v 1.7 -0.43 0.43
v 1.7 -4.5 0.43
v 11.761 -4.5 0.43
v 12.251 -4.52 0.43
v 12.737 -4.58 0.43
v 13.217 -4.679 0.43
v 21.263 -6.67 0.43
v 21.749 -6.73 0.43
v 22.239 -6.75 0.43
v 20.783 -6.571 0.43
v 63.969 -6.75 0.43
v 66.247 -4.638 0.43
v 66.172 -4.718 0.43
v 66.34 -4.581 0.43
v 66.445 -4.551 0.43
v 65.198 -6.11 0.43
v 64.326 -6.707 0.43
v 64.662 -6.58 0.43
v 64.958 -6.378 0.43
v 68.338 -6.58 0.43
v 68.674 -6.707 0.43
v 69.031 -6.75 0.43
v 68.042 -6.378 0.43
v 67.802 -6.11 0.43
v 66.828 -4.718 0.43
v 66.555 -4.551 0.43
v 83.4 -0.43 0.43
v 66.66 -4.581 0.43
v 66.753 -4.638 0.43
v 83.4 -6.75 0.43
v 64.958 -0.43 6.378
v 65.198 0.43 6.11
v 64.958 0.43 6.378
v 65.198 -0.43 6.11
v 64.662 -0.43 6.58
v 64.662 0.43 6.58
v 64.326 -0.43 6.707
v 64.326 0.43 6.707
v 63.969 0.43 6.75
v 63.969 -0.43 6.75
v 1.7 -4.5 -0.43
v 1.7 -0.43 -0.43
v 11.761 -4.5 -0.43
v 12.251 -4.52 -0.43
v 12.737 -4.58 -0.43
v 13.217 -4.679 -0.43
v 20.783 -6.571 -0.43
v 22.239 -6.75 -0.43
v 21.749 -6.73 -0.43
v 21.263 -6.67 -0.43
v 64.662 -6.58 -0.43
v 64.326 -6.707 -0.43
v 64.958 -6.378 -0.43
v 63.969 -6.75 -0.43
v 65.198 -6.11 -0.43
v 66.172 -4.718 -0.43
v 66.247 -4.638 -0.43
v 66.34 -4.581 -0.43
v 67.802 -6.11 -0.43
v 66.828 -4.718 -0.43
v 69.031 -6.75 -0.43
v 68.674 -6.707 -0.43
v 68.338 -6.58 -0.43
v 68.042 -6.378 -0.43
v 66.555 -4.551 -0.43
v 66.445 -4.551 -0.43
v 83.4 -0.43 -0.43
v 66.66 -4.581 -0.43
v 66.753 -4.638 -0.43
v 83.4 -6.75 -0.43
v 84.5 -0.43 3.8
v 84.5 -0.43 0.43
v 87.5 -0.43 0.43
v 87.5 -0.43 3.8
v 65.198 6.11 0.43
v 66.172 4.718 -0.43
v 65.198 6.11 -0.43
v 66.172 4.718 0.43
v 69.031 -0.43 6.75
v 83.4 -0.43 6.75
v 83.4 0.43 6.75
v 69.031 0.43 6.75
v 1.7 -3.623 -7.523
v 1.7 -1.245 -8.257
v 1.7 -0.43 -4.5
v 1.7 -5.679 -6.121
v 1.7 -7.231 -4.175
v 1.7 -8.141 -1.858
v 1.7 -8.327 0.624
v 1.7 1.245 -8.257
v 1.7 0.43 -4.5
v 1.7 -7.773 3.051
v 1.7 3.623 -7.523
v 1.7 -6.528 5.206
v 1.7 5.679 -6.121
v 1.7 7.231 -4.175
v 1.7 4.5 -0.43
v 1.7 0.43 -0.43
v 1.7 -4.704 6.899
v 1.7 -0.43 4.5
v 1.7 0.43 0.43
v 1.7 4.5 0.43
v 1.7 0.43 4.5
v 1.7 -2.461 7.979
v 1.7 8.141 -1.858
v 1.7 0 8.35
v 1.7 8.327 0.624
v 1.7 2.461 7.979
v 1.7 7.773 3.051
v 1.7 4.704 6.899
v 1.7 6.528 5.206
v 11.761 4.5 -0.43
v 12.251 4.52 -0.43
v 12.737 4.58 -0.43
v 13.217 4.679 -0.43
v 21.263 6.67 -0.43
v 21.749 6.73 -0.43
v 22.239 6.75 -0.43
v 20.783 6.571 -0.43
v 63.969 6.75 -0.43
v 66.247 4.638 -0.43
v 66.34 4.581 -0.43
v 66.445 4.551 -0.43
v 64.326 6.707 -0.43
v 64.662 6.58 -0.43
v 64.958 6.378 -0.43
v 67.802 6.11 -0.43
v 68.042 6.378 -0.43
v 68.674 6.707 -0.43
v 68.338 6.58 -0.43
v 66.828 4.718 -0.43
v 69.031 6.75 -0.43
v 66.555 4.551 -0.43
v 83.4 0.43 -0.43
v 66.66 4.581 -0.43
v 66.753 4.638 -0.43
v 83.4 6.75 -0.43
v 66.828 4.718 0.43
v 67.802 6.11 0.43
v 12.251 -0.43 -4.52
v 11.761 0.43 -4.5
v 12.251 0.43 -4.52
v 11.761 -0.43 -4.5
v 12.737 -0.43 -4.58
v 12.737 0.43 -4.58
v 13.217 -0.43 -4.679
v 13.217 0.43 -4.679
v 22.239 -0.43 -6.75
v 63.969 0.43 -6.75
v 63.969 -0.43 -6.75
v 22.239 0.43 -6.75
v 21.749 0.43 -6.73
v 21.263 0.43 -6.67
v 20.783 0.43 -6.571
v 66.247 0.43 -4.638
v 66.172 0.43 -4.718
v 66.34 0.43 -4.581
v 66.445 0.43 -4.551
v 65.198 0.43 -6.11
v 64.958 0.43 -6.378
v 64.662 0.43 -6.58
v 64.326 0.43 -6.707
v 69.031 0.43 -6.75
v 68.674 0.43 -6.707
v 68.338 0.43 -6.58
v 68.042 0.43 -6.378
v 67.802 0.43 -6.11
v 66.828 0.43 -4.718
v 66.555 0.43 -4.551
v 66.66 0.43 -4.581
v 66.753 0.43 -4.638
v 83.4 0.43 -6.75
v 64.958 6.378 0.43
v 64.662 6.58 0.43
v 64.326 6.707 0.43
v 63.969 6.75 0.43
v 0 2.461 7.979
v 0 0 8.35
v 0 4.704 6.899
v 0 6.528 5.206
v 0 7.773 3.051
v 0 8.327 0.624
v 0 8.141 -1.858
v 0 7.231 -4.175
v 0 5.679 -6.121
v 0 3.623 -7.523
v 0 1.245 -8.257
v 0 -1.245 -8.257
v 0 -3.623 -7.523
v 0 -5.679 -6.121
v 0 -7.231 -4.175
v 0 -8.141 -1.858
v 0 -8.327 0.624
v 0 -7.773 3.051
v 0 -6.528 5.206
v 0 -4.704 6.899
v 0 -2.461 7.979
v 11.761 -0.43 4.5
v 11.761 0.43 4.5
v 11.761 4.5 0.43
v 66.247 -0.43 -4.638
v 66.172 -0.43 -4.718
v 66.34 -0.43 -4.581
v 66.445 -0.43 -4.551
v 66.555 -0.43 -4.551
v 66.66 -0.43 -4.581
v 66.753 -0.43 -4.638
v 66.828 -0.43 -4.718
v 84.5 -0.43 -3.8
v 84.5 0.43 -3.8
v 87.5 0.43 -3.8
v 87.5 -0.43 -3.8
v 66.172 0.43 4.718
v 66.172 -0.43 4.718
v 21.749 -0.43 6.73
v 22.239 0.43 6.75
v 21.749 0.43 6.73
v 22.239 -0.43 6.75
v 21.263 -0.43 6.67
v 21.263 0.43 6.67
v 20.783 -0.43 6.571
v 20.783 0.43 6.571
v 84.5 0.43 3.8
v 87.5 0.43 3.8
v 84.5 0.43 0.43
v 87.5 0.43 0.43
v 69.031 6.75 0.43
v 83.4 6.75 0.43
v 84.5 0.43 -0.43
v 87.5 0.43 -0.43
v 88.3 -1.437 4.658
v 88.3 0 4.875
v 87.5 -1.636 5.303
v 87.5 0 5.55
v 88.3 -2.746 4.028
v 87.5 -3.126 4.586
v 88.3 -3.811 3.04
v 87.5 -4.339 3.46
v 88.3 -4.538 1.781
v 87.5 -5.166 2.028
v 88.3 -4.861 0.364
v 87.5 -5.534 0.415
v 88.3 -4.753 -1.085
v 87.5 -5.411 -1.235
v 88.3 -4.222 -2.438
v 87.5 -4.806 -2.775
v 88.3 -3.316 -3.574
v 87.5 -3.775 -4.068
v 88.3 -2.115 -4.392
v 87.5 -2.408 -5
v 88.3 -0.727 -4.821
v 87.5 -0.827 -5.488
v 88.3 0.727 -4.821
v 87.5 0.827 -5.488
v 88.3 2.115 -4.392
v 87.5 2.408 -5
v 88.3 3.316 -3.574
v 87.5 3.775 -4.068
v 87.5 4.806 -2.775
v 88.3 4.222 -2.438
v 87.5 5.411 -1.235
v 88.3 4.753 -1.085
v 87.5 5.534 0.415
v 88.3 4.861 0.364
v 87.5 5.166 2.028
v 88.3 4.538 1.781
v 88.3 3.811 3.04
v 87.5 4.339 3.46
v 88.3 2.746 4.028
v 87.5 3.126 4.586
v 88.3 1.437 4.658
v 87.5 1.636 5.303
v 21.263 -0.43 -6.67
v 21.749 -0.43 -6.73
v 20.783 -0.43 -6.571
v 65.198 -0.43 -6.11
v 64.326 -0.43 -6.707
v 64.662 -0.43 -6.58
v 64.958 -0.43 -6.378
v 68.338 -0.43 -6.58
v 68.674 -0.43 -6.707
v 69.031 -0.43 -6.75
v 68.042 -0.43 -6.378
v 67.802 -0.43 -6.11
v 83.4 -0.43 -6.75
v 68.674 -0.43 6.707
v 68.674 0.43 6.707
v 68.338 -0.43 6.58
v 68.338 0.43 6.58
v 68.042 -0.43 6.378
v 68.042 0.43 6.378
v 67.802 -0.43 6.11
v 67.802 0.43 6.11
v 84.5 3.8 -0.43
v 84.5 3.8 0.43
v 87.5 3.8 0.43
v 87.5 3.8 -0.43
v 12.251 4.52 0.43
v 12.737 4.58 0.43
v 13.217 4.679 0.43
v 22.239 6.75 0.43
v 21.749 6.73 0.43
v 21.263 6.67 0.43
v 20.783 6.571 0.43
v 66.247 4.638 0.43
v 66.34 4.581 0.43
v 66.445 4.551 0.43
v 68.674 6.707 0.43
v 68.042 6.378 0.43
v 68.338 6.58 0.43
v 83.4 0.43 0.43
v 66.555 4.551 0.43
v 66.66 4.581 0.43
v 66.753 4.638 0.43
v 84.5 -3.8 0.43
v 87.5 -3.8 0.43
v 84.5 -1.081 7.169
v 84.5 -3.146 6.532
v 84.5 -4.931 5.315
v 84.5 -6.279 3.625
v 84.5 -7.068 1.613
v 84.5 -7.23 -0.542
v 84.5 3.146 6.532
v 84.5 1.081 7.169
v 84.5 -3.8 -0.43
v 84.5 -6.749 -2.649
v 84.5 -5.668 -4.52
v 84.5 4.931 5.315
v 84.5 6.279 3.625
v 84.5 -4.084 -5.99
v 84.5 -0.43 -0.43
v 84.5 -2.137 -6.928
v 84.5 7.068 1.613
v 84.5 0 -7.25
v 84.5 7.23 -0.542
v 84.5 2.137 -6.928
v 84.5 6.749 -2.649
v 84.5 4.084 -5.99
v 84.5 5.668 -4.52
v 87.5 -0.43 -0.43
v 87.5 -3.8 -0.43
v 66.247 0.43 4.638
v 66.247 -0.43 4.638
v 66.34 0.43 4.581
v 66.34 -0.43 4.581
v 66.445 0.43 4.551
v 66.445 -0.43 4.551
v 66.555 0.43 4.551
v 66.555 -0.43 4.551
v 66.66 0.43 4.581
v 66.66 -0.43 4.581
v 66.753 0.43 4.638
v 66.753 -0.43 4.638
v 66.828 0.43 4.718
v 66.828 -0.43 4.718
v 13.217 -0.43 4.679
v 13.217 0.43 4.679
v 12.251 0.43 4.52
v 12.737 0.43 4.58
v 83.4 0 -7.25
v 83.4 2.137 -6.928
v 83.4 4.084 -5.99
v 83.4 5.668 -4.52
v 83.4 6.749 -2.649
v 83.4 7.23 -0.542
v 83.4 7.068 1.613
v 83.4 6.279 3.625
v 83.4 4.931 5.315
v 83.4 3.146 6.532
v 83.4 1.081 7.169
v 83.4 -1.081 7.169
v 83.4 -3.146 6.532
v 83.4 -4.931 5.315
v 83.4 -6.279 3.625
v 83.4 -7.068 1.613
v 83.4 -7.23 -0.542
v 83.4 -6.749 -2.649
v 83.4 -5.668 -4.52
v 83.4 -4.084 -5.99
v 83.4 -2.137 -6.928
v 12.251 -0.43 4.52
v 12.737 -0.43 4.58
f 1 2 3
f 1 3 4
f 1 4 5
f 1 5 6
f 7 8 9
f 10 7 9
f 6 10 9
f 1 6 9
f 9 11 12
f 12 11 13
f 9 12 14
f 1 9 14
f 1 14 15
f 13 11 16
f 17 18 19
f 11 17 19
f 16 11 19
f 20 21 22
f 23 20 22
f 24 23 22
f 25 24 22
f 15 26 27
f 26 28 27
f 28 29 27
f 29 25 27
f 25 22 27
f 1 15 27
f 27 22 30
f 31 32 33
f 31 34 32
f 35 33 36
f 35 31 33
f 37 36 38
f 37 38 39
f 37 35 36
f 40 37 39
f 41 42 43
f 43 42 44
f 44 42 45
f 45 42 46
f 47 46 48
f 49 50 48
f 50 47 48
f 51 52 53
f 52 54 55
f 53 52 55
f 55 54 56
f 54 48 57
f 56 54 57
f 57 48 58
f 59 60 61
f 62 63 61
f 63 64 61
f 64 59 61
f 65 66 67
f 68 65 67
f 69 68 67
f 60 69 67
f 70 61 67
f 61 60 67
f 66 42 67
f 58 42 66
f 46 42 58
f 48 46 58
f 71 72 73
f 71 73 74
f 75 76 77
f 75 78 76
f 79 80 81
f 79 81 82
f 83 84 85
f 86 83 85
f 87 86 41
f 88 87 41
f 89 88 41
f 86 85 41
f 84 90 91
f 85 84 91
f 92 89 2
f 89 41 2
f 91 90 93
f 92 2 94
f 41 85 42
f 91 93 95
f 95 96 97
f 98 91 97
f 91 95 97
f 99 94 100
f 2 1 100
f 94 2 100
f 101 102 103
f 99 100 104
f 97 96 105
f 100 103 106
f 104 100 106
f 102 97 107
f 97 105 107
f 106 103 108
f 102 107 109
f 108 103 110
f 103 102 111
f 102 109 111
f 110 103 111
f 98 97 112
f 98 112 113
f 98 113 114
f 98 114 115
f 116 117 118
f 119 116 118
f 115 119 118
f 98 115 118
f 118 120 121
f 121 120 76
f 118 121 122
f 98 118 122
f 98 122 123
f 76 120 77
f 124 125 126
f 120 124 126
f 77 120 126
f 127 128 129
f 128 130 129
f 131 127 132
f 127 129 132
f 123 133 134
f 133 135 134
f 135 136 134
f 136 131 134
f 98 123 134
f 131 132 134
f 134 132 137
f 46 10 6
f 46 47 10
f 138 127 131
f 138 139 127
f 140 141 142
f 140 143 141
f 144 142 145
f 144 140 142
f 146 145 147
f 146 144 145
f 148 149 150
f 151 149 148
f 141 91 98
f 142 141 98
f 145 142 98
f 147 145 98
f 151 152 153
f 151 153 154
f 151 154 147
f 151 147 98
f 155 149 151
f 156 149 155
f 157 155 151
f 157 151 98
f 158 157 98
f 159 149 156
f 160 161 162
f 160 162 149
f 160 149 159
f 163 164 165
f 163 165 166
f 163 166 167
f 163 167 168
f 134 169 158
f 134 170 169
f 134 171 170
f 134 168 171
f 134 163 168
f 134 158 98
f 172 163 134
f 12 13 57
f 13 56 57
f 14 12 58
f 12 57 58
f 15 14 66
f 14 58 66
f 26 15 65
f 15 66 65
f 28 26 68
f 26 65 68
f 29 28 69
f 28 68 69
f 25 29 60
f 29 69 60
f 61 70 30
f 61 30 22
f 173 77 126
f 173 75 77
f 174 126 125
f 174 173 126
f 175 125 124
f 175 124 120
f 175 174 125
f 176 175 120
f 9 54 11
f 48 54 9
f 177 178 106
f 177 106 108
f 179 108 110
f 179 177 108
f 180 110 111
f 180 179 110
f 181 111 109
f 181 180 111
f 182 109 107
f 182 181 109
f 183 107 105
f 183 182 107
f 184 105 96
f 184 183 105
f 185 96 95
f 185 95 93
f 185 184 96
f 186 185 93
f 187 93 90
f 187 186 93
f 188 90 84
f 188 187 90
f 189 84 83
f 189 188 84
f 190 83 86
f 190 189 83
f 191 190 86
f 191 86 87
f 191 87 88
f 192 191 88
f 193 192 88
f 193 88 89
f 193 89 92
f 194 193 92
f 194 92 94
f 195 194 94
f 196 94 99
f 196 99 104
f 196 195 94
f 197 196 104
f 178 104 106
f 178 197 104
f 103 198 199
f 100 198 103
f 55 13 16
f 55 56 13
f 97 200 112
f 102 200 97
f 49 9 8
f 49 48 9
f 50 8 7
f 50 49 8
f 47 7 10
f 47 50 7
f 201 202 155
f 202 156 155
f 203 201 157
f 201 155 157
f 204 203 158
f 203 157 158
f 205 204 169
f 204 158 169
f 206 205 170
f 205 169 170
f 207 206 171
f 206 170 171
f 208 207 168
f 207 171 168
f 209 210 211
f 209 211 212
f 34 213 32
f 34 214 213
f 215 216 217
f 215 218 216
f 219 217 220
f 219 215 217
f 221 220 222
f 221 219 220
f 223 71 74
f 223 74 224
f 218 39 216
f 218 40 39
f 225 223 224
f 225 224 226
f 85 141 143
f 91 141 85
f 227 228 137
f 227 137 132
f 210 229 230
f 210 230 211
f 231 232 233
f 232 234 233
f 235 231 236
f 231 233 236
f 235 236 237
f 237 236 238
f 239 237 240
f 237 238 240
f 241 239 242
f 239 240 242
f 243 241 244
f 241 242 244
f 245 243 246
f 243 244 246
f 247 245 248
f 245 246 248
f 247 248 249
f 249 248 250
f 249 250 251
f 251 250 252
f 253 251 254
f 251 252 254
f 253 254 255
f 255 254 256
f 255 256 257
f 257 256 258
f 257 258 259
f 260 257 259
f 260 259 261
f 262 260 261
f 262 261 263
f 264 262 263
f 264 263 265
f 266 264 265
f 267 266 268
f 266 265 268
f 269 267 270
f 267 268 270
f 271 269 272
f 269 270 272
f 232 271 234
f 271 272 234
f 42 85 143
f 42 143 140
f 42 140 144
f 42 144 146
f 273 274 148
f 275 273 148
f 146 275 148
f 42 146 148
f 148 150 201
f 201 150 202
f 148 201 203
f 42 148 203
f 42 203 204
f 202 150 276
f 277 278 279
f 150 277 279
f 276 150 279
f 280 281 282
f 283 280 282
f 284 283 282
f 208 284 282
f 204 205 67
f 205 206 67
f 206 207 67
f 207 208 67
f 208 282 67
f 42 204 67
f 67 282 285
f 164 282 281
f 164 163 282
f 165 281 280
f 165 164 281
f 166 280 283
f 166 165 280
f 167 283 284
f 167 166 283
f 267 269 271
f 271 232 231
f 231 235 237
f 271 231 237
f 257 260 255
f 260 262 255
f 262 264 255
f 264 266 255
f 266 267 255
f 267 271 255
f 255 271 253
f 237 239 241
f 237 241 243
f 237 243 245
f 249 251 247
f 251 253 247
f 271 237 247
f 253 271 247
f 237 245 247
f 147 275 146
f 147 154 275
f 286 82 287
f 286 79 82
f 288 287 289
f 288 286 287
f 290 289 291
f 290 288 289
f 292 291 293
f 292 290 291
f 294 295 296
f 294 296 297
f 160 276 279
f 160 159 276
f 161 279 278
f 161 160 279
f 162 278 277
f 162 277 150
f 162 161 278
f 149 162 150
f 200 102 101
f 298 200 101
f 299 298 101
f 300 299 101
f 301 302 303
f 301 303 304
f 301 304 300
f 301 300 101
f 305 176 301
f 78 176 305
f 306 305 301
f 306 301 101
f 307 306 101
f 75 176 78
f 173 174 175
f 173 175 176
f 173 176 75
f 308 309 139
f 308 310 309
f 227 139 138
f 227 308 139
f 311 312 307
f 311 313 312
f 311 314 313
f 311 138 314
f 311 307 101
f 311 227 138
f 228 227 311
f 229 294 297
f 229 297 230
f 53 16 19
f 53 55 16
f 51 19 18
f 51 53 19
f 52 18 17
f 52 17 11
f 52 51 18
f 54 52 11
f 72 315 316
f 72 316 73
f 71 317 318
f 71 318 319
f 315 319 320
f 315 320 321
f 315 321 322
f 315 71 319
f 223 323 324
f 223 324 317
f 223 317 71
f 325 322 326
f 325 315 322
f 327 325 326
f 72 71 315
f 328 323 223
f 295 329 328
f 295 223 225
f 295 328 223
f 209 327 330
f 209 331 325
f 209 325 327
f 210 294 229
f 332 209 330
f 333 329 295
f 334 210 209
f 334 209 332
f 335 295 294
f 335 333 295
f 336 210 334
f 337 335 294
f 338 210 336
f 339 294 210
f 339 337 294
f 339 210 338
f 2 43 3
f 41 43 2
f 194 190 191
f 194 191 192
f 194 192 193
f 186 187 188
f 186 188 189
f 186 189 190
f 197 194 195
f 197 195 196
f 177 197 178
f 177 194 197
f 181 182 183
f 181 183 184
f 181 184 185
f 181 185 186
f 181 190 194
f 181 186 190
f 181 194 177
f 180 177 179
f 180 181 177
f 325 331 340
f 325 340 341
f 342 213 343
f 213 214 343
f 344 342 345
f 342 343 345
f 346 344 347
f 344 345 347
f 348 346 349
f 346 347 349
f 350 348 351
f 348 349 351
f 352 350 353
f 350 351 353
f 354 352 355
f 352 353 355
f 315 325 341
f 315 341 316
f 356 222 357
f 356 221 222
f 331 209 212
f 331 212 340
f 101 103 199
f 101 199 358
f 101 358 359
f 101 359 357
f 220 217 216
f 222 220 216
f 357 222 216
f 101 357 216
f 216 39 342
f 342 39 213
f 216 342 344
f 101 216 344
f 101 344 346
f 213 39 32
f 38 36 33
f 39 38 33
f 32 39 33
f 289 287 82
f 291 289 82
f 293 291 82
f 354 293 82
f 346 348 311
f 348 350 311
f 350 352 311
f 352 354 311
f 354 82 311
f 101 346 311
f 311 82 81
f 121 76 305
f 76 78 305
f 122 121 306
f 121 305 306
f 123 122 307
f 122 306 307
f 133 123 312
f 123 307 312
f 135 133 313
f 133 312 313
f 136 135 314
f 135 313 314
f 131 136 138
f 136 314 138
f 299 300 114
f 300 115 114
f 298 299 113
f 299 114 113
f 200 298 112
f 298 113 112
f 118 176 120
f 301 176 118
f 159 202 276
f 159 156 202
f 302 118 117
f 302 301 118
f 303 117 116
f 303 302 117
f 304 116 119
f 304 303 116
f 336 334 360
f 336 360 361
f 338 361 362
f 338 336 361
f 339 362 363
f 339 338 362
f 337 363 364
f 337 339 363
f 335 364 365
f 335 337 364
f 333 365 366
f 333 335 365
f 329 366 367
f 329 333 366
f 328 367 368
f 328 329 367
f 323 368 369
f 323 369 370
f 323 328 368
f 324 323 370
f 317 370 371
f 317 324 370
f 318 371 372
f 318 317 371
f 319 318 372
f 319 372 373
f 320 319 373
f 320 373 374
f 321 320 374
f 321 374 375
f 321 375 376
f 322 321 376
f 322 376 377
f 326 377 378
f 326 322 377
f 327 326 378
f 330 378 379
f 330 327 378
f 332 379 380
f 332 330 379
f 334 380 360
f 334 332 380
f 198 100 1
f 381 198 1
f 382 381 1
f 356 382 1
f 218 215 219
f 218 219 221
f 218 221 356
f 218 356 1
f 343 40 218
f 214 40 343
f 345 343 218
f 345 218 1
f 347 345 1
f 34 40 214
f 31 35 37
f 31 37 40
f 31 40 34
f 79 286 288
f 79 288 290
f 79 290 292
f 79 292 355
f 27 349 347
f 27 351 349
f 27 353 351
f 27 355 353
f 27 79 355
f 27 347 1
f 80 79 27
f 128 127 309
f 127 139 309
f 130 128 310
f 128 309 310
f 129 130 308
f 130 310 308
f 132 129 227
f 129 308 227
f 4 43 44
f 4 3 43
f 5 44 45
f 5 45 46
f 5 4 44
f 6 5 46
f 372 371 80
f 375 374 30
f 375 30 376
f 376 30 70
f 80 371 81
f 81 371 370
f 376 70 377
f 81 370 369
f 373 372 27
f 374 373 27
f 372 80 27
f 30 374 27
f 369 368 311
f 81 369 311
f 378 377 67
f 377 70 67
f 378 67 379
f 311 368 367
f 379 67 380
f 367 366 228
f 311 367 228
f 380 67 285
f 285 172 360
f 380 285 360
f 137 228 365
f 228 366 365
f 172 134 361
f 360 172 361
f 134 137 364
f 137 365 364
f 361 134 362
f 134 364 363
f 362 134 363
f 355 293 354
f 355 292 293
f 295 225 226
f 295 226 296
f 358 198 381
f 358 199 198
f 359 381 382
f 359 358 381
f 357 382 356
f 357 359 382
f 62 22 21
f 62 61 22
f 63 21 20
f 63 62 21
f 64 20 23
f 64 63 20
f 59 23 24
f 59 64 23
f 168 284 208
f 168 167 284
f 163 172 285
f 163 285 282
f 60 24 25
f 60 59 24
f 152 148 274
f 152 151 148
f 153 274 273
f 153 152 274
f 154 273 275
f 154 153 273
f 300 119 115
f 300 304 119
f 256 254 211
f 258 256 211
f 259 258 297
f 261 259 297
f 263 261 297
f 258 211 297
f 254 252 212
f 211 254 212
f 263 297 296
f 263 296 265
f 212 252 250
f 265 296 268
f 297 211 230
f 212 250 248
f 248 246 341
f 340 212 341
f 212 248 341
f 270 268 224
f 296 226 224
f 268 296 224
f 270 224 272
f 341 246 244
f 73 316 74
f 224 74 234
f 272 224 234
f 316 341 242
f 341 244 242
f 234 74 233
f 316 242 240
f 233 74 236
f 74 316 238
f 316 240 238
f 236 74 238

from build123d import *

# Parameters (mm, degrees)
BOSS_EXTRUDE1_DEPTH = 0.43
SKETCH2_R           = 8.35
BOSS_EXTRUDE2_DEPTH = 1.7
CIRPATTERN1_COUNT   = 4
SKETCH3_R           = 7.25
BOSS_EXTRUDE3_DEPTH = 1.1
BOSS_EXTRUDE4_DEPTH = 3
FILLET1_R           = 0.4
FILLET2_R           = 1.5
FILLET3_R           = 6


with BuildPart() as part:
    # Sketch1 → Boss-Extrude1 (new, symmetric)
    with BuildSketch(Plane.XY):
        Polygon((0, 0), (84.5, 0), (84.5, 6.75), (68.25, 6.75), (66.5, 4.25), (64.75, 6.75), (21.5, 6.75), (12.5, 4.5), (0, 4.5), align=None)
    boss_extrude1 = extrude(amount=BOSS_EXTRUDE1_DEPTH, both=True)

    # Sketch2 → Boss-Extrude2 (add)
    with BuildSketch(Plane.ZY):
        Circle(SKETCH2_R)
    extrude(amount=-BOSS_EXTRUDE2_DEPTH)

    # CirPattern1: Boss-Extrude1 ×4 about axis
    cirpattern1_axis = Axis((1.7, 0, 0), (1, 0, 0))
    for i in range(1, CIRPATTERN1_COUNT):
        add(boss_extrude1.rotate(cirpattern1_axis, i * 360 / CIRPATTERN1_COUNT))

    # Sketch3 → Boss-Extrude3 (add)
    with BuildSketch(Plane(origin=(84.5, 0, 0), x_dir=(0, 0, -1), z_dir=(1, 0, 0))):
        Circle(SKETCH3_R)
    extrude(amount=-BOSS_EXTRUDE3_DEPTH)

    # Sketch4 → Boss-Extrude4 (add)
    with BuildSketch(Plane(origin=(84.5, 0, 0), x_dir=(0, 0, -1), z_dir=(1, 0, 0))):
        Polygon((-3.8, -0.43), (-3.8, 0.43), (-0.43, 0.43), (-0.43, 3.8), (0.43, 3.8), (0.43, 0.43), (3.8, 0.43), (3.8, -0.43), (0.43, -0.43), (0.43, -3.8), (-0.43, -3.8), (-0.43, -0.43), align=None)
    extrude(amount=BOSS_EXTRUDE4_DEPTH)

    # Sketch6 → Revolve1 (revolve)
    with BuildSketch(Plane(origin=(0, 0, 0), x_dir=(1, 0, 0), z_dir=(0, 1, 0))):
        Polygon((87.5, 0), (88.3, 0), (88.3, -4.875), (87.5, -5.55), align=None)
    revolve(axis=Axis((87.5, 0, 0), (1, 0, 0)))

    # Fillet1
    fillet1_edges = [part.edges().sort_by_distance(p)[0] for p in [
        (66.5, 0, -4.25),
        (66.5, -4.25, 0),
        (66.5, 0, 4.25),
        (66.5, 4.25, 0),
    ]]
    fillet(fillet1_edges, radius=FILLET1_R)

    # Fillet2
    fillet2_edges = [part.edges().sort_by_distance(p)[0] for p in [
        (68.25, 0, -6.75),
        (64.75, 0, -6.75),
        (68.25, 6.75, 0),
        (64.75, 6.75, 0),
        (64.75, 0, 6.75),
        (68.25, 0, 6.75),
        (64.75, -6.75, 0),
        (68.25, -6.75, 0),
    ]]
    fillet(fillet2_edges, radius=FILLET2_R)

    # Fillet3
    fillet3_edges = [part.edges().sort_by_distance(p)[0] for p in [
        (12.5, 4.5, 0),
        (21.5, 6.75, 0),
        (12.5, 0, -4.5),
        (21.5, 0, -6.75),
        (21.5, -6.75, 0),
        (12.5, -4.5, 0),
        (12.5, 0, 4.5),
        (21.5, 0, 6.75),
    ]]
    fillet(fillet3_edges, radius=FILLET3_R)


solid = part.part
